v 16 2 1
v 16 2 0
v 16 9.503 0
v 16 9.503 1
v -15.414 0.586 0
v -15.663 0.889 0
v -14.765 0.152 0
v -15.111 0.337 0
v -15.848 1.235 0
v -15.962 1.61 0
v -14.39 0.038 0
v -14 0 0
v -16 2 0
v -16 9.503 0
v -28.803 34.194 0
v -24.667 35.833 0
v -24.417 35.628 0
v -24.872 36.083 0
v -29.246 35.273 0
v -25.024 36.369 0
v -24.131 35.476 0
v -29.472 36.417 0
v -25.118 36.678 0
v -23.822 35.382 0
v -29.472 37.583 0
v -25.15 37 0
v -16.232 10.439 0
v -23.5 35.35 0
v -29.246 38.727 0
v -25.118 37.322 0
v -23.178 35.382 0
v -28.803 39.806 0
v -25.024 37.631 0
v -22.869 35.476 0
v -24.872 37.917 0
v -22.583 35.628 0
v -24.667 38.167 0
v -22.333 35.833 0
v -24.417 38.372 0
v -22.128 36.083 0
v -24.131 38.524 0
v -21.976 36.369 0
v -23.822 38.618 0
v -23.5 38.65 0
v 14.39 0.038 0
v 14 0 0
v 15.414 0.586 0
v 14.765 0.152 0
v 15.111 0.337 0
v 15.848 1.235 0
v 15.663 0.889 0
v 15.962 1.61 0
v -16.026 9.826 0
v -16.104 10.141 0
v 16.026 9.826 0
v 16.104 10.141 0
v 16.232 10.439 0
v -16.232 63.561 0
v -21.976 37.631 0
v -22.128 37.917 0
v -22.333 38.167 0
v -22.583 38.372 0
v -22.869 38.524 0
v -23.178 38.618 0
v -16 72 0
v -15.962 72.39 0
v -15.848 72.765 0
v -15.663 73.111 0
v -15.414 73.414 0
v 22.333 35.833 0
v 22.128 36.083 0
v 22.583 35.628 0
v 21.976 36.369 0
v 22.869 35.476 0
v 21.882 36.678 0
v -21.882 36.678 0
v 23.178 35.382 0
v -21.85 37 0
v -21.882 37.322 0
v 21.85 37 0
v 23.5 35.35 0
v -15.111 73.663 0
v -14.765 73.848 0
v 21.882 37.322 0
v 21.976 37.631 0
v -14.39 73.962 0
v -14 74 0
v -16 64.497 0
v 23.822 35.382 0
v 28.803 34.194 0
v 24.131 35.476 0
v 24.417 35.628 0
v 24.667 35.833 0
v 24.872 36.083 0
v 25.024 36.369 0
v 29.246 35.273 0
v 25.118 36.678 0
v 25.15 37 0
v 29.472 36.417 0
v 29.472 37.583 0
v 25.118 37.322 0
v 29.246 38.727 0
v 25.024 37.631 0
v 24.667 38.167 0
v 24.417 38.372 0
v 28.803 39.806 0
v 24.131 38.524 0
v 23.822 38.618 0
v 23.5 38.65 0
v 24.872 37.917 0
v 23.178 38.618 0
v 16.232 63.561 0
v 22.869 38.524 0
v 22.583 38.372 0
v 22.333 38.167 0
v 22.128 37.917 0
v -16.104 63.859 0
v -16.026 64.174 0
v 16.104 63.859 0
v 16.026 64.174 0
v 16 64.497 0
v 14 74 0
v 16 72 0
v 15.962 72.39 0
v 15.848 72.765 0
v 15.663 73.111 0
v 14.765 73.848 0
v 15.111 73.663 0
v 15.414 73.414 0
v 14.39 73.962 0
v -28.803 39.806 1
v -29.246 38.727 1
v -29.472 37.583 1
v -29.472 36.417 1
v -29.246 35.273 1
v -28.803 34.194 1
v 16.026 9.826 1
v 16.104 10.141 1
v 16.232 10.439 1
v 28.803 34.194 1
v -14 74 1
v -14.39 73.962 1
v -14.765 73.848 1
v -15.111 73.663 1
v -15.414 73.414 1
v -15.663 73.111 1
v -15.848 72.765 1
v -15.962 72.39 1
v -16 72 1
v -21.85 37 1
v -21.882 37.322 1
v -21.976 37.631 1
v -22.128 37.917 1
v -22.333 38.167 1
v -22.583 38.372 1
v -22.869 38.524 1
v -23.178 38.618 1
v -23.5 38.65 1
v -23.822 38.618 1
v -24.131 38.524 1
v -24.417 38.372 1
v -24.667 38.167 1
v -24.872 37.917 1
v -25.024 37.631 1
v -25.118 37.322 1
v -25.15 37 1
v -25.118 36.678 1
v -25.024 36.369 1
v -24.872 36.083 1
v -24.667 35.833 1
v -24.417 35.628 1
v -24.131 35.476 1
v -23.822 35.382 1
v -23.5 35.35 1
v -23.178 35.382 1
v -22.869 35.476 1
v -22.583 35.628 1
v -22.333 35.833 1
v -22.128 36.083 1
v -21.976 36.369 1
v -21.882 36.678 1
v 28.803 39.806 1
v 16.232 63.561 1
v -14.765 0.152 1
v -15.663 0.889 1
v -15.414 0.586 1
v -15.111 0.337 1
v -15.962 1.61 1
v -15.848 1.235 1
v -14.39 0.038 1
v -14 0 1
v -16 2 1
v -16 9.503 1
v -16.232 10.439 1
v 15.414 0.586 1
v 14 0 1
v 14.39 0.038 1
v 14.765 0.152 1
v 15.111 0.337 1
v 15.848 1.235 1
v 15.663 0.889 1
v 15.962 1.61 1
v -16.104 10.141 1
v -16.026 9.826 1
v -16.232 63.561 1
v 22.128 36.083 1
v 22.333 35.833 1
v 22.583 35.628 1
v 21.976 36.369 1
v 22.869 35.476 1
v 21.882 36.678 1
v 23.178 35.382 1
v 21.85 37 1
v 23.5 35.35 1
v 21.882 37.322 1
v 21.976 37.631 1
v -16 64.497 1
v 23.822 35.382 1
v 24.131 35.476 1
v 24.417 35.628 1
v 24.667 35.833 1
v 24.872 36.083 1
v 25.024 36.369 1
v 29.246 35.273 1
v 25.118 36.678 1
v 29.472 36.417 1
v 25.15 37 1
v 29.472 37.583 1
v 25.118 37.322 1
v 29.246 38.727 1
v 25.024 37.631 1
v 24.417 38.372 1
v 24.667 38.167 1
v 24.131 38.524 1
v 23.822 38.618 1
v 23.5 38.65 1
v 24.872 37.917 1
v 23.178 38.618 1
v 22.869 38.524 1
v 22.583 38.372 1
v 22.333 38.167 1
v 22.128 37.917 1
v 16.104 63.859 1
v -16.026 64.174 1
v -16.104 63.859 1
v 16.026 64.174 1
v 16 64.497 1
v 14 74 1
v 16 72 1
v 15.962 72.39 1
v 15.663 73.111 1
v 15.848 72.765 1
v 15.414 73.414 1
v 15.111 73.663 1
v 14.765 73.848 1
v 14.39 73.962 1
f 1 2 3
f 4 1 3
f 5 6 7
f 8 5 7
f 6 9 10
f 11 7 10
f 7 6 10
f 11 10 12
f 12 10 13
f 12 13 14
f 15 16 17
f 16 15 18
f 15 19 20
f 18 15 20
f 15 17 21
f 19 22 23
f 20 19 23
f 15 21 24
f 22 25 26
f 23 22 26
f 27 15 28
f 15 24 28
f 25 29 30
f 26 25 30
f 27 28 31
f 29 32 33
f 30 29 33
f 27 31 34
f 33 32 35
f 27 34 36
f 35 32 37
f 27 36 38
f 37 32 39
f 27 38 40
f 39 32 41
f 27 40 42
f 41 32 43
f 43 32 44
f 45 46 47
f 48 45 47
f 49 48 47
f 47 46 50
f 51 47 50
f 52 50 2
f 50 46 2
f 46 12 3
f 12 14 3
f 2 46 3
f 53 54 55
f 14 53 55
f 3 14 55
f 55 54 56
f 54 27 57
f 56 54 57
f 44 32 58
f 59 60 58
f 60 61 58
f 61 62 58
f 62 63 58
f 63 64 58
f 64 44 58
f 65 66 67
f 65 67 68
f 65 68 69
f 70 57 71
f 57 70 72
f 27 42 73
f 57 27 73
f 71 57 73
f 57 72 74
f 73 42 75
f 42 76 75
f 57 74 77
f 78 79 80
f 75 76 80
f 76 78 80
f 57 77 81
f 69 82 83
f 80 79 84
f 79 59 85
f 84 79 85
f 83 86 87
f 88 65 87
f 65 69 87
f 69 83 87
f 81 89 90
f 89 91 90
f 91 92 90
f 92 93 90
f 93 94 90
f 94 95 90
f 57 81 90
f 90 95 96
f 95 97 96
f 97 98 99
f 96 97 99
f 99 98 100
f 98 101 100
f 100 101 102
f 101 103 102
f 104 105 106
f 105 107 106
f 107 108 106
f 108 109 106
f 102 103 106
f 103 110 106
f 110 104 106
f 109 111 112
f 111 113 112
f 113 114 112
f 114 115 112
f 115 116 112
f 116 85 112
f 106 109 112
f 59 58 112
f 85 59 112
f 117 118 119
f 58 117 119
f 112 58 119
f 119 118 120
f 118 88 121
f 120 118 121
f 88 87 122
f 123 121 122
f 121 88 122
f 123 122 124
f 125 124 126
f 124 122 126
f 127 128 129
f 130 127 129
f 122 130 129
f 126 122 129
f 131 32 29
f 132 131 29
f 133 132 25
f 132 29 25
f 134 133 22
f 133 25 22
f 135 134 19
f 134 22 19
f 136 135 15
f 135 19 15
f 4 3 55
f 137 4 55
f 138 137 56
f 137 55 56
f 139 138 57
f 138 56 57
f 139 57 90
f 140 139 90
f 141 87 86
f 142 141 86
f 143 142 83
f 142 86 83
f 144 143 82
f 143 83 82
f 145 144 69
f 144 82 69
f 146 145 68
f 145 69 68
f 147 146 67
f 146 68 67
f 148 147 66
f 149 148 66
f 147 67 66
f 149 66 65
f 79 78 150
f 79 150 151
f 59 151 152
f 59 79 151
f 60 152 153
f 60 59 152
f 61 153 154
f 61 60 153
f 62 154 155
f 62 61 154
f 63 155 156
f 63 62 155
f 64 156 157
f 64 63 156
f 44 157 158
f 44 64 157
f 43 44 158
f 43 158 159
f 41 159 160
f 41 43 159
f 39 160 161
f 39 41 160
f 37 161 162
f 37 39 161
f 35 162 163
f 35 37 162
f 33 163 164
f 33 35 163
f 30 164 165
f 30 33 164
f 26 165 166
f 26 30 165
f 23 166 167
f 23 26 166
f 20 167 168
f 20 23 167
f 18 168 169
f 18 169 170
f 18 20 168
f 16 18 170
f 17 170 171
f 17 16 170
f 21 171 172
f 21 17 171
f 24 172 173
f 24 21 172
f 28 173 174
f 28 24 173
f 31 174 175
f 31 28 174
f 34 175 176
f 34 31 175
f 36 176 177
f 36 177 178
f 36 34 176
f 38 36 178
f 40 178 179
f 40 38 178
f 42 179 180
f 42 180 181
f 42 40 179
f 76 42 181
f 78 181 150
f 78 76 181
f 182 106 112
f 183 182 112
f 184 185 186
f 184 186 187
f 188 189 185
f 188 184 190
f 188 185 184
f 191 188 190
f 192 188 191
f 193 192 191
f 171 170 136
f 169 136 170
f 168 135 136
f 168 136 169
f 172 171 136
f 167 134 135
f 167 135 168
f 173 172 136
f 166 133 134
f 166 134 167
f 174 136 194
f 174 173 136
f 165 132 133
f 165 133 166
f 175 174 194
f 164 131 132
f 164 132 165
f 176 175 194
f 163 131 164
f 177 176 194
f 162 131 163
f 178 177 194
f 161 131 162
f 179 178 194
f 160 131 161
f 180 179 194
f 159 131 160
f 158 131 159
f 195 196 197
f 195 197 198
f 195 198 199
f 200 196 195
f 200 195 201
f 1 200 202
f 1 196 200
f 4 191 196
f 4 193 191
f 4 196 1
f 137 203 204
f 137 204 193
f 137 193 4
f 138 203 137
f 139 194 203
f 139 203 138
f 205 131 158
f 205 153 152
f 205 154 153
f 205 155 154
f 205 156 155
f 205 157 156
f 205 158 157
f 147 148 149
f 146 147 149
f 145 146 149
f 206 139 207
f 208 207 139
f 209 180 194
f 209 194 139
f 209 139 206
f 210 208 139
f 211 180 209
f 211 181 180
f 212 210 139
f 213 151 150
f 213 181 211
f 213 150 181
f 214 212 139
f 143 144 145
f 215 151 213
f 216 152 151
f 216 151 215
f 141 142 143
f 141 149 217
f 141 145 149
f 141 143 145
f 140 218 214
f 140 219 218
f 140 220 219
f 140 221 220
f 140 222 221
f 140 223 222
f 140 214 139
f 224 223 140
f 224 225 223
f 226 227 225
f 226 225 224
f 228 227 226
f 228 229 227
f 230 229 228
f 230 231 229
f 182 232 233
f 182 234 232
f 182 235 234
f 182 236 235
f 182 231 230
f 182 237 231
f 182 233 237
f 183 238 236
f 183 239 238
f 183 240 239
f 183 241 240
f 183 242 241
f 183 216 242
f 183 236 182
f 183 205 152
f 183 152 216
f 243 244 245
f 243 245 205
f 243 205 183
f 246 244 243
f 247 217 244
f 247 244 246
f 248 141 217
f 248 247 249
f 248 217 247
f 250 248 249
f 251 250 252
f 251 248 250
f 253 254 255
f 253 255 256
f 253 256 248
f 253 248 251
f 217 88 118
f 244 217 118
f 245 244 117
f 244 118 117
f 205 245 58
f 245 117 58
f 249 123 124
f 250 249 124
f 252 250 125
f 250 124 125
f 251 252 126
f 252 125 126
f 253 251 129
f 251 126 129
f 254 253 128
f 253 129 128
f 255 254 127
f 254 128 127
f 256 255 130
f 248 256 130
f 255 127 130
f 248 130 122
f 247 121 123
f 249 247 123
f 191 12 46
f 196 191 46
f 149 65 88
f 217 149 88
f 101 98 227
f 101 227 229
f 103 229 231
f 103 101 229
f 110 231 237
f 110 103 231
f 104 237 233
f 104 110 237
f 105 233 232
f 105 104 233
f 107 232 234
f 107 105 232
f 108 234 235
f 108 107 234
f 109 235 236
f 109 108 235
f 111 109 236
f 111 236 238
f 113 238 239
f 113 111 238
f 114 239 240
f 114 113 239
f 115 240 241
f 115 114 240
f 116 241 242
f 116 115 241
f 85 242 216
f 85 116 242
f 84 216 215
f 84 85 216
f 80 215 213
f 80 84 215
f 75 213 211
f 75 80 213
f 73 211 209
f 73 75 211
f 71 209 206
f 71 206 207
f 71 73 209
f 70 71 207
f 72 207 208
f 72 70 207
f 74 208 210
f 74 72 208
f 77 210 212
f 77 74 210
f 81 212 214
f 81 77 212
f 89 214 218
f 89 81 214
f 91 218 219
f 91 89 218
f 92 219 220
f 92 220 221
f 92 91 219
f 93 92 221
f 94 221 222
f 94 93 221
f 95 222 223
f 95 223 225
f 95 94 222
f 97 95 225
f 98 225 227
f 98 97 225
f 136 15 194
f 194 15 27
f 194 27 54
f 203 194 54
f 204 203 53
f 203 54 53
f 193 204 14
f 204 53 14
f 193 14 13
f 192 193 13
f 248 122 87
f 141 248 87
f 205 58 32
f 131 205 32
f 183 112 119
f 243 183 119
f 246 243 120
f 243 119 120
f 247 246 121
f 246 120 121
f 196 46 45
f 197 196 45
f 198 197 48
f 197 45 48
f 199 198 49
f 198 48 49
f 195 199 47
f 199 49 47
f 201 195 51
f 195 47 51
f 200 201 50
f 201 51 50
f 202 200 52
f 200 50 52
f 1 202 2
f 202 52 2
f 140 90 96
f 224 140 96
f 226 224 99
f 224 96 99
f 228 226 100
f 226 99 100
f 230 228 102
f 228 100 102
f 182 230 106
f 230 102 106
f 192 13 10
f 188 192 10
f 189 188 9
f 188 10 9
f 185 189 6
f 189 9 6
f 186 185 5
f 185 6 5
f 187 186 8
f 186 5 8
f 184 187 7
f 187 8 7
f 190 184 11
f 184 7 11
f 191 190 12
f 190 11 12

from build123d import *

# Parameters (mm, degrees)
F0_R     = 1.65
F1_DEPTH = 1


with BuildPart() as f1:
    # F0 (on Top) → F1 (new body)
    with BuildSketch(Plane.XY):
        with BuildLine():
            Line((0, 74), (0, 0))
            Line((0, 0), (14, 0))
            ThreePointArc((14, 0), (15.414214, 0.585786), (16, 2))
            Line((16, 2), (16, 9.503425))
            ThreePointArc((16, 9.503425), (16.058935, 9.985367), (16.232268, 10.438906))
            Line((16.232268, 10.438906), (28.803195, 34.193557))
            ThreePointArc((28.803195, 34.193557), (29.5, 37), (28.803195, 39.806443))
            Line((28.803195, 39.806443), (16.232268, 63.561094))
            ThreePointArc((16.232268, 63.561094), (16.058935, 64.014633), (16, 64.496575))
            Line((16, 64.496575), (16, 72))
            ThreePointArc((16, 72), (15.414214, 73.414214), (14, 74))
            Line((14, 74), (0, 74))
        make_face()
        with Locations((23.5, 37)):
            Circle(F0_R, mode=Mode.SUBTRACT)
        with BuildLine():
            Line((-14, 0), (0, 0))
            Line((0, 0), (0, 74))
            Line((0, 74), (-14, 74))
            ThreePointArc((-14, 74), (-15.414214, 73.414214), (-16, 72))
            Line((-16, 72), (-16, 64.496575))
            ThreePointArc((-16, 64.496575), (-16.058935, 64.014633), (-16.232268, 63.561094))
            Line((-16.232268, 63.561094), (-28.803195, 39.806443))
            ThreePointArc((-28.803195, 39.806443), (-29.5, 37), (-28.803195, 34.193557))
            Line((-28.803195, 34.193557), (-16.232268, 10.438906))
            ThreePointArc((-16.232268, 10.438906), (-16.058935, 9.985367), (-16, 9.503425))
            Line((-16, 9.503425), (-16, 2))
            ThreePointArc((-16, 2), (-15.414214, 0.585786), (-14, 0))
        make_face()
        with Locations((-23.5, 37)):
            Circle(F0_R, mode=Mode.SUBTRACT)
    extrude(amount=F1_DEPTH)


solid = f1.part
